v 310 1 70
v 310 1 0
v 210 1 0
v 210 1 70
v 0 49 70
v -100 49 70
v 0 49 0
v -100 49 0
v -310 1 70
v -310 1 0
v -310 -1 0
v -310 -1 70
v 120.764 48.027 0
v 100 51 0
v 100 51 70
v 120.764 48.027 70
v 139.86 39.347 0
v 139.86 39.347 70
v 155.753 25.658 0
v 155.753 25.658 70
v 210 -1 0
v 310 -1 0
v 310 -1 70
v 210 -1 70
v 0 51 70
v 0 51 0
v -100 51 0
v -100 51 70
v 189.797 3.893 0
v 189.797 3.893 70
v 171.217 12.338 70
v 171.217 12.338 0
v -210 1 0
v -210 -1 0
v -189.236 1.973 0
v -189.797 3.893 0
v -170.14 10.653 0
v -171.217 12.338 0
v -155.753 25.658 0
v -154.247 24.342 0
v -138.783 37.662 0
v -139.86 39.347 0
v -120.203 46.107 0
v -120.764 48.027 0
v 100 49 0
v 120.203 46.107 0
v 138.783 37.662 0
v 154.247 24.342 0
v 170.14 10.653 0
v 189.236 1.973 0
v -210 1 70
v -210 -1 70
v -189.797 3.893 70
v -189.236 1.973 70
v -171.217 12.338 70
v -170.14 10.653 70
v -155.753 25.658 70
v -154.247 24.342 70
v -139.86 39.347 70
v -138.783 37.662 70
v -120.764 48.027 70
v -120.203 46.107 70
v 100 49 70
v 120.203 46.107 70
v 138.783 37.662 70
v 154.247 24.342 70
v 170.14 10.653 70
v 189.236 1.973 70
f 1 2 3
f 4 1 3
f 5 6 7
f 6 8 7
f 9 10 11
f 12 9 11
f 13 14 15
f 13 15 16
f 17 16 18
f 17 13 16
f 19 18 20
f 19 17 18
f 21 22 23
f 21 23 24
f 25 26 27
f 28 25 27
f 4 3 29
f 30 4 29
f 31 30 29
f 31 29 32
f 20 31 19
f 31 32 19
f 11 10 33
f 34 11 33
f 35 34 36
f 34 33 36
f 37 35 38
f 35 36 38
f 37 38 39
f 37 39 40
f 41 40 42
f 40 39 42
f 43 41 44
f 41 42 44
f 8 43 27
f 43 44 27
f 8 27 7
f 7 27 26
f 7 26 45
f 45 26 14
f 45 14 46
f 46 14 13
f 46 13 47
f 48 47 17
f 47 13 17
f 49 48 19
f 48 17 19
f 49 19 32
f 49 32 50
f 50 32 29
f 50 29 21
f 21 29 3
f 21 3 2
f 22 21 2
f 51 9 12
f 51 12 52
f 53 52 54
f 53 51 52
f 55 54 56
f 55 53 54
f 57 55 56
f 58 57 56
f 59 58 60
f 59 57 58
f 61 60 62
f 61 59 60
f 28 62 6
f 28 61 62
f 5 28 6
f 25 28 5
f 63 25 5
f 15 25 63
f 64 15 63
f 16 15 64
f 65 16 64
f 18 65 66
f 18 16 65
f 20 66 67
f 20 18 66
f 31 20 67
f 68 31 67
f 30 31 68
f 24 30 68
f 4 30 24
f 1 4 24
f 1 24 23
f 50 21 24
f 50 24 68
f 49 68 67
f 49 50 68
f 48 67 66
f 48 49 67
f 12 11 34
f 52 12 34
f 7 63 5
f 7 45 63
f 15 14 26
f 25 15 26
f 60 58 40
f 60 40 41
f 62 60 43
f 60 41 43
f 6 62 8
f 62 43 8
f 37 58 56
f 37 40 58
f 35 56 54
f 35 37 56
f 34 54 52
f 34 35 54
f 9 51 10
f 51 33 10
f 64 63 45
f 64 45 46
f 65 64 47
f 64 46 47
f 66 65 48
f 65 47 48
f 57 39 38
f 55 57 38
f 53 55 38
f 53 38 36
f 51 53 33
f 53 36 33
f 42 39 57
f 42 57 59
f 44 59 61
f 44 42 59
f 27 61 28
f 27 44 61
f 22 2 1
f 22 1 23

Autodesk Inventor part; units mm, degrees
ref_plane "YZ Plane" through (0, 0, 0) normal (1, 0, 0) x (0, 1, 0)
ref_plane "XZ Plane" through (0, 0, 0) normal (0, 1, 0) x (-1, 0, 0)
ref_plane "XY Plane" through (0, 0, 0) normal (0, 0, 1) x (1, 0, 0)
sketch "Эскиз4" plane through (0, 0, 0) normal (0, 0, 1) x (1, 0, 0)
  line L0 (-310, 0) -> (-210, 0)
  arc A0 (-210, 0) -> (-155, 25) centre (-210, 73) ccw
  arc A1 (-100, 50) -> (-155, 25) centre (-100, -23) ccw
  line L1 (-100, 50) -> (0, 50)
  line L2 (0, -42.2) -> (0, 92.2)
  line L3 (310, 0) -> (210, 0)
  arc A2 (155, 25) -> (210, 0) centre (210, 73) ccw
  arc A3 (155, 25) -> (100, 50) centre (100, -23) ccw
  line L4 (100, 50) -> (0, 50)
  point P0 (0, 0)
  dimension "d39" = 50
  dimension "d61" = 100
  dimension "d63" = 200
  dimension "d64" = 620
contour flange "Фланец по контуру2" sketch "Эскиз4" thickness 2 bend radius 2 width 70 along (0, 0, 1) mid plane no both sides yes wall seen from (260, 0, 0) lies toward (0, -1, 0) curves L3 A2 A3 L4 L1 A1 A0 L0
bend "Сгиб3"
corner "УглСтык3"
equation "\"d26\" = Толщина"
equation "\"d27\" = Ширина_просечки"
equation "\"d28\" = Глубина_просечки"
equation "\"d29\" = Мин_остаток"
equation "\"d30\" = Радиус_перехода"
equation "\"d32\" = Радиус_гибки"
equation "\"d34\" = Размер_просечки"
equation "\"d35\" = Размер_зазора"
equation "\"d36\" = Радиус_Якоби"
equation "\"Радиус_гибки\" = Толщина"
equation "\"Ширина_просечки\" = Толщина"
equation "\"Глубина_просечки\" = 0.5 * Толщина"
equation "\"Размер_просечки\" = 4 * Толщина"
equation "\"Мин_остаток\" = 2 * Толщина"
equation "\"Радиус_перехода\" = Радиус_гибки"
equation "\"Радиус_Якоби\" = Радиус_гибки"
equation "\"Размер_зазора\" = Толщина"
equation "\"Толщина\" = 2"
properties part number "Кожух" material "Алюминий 6061"
